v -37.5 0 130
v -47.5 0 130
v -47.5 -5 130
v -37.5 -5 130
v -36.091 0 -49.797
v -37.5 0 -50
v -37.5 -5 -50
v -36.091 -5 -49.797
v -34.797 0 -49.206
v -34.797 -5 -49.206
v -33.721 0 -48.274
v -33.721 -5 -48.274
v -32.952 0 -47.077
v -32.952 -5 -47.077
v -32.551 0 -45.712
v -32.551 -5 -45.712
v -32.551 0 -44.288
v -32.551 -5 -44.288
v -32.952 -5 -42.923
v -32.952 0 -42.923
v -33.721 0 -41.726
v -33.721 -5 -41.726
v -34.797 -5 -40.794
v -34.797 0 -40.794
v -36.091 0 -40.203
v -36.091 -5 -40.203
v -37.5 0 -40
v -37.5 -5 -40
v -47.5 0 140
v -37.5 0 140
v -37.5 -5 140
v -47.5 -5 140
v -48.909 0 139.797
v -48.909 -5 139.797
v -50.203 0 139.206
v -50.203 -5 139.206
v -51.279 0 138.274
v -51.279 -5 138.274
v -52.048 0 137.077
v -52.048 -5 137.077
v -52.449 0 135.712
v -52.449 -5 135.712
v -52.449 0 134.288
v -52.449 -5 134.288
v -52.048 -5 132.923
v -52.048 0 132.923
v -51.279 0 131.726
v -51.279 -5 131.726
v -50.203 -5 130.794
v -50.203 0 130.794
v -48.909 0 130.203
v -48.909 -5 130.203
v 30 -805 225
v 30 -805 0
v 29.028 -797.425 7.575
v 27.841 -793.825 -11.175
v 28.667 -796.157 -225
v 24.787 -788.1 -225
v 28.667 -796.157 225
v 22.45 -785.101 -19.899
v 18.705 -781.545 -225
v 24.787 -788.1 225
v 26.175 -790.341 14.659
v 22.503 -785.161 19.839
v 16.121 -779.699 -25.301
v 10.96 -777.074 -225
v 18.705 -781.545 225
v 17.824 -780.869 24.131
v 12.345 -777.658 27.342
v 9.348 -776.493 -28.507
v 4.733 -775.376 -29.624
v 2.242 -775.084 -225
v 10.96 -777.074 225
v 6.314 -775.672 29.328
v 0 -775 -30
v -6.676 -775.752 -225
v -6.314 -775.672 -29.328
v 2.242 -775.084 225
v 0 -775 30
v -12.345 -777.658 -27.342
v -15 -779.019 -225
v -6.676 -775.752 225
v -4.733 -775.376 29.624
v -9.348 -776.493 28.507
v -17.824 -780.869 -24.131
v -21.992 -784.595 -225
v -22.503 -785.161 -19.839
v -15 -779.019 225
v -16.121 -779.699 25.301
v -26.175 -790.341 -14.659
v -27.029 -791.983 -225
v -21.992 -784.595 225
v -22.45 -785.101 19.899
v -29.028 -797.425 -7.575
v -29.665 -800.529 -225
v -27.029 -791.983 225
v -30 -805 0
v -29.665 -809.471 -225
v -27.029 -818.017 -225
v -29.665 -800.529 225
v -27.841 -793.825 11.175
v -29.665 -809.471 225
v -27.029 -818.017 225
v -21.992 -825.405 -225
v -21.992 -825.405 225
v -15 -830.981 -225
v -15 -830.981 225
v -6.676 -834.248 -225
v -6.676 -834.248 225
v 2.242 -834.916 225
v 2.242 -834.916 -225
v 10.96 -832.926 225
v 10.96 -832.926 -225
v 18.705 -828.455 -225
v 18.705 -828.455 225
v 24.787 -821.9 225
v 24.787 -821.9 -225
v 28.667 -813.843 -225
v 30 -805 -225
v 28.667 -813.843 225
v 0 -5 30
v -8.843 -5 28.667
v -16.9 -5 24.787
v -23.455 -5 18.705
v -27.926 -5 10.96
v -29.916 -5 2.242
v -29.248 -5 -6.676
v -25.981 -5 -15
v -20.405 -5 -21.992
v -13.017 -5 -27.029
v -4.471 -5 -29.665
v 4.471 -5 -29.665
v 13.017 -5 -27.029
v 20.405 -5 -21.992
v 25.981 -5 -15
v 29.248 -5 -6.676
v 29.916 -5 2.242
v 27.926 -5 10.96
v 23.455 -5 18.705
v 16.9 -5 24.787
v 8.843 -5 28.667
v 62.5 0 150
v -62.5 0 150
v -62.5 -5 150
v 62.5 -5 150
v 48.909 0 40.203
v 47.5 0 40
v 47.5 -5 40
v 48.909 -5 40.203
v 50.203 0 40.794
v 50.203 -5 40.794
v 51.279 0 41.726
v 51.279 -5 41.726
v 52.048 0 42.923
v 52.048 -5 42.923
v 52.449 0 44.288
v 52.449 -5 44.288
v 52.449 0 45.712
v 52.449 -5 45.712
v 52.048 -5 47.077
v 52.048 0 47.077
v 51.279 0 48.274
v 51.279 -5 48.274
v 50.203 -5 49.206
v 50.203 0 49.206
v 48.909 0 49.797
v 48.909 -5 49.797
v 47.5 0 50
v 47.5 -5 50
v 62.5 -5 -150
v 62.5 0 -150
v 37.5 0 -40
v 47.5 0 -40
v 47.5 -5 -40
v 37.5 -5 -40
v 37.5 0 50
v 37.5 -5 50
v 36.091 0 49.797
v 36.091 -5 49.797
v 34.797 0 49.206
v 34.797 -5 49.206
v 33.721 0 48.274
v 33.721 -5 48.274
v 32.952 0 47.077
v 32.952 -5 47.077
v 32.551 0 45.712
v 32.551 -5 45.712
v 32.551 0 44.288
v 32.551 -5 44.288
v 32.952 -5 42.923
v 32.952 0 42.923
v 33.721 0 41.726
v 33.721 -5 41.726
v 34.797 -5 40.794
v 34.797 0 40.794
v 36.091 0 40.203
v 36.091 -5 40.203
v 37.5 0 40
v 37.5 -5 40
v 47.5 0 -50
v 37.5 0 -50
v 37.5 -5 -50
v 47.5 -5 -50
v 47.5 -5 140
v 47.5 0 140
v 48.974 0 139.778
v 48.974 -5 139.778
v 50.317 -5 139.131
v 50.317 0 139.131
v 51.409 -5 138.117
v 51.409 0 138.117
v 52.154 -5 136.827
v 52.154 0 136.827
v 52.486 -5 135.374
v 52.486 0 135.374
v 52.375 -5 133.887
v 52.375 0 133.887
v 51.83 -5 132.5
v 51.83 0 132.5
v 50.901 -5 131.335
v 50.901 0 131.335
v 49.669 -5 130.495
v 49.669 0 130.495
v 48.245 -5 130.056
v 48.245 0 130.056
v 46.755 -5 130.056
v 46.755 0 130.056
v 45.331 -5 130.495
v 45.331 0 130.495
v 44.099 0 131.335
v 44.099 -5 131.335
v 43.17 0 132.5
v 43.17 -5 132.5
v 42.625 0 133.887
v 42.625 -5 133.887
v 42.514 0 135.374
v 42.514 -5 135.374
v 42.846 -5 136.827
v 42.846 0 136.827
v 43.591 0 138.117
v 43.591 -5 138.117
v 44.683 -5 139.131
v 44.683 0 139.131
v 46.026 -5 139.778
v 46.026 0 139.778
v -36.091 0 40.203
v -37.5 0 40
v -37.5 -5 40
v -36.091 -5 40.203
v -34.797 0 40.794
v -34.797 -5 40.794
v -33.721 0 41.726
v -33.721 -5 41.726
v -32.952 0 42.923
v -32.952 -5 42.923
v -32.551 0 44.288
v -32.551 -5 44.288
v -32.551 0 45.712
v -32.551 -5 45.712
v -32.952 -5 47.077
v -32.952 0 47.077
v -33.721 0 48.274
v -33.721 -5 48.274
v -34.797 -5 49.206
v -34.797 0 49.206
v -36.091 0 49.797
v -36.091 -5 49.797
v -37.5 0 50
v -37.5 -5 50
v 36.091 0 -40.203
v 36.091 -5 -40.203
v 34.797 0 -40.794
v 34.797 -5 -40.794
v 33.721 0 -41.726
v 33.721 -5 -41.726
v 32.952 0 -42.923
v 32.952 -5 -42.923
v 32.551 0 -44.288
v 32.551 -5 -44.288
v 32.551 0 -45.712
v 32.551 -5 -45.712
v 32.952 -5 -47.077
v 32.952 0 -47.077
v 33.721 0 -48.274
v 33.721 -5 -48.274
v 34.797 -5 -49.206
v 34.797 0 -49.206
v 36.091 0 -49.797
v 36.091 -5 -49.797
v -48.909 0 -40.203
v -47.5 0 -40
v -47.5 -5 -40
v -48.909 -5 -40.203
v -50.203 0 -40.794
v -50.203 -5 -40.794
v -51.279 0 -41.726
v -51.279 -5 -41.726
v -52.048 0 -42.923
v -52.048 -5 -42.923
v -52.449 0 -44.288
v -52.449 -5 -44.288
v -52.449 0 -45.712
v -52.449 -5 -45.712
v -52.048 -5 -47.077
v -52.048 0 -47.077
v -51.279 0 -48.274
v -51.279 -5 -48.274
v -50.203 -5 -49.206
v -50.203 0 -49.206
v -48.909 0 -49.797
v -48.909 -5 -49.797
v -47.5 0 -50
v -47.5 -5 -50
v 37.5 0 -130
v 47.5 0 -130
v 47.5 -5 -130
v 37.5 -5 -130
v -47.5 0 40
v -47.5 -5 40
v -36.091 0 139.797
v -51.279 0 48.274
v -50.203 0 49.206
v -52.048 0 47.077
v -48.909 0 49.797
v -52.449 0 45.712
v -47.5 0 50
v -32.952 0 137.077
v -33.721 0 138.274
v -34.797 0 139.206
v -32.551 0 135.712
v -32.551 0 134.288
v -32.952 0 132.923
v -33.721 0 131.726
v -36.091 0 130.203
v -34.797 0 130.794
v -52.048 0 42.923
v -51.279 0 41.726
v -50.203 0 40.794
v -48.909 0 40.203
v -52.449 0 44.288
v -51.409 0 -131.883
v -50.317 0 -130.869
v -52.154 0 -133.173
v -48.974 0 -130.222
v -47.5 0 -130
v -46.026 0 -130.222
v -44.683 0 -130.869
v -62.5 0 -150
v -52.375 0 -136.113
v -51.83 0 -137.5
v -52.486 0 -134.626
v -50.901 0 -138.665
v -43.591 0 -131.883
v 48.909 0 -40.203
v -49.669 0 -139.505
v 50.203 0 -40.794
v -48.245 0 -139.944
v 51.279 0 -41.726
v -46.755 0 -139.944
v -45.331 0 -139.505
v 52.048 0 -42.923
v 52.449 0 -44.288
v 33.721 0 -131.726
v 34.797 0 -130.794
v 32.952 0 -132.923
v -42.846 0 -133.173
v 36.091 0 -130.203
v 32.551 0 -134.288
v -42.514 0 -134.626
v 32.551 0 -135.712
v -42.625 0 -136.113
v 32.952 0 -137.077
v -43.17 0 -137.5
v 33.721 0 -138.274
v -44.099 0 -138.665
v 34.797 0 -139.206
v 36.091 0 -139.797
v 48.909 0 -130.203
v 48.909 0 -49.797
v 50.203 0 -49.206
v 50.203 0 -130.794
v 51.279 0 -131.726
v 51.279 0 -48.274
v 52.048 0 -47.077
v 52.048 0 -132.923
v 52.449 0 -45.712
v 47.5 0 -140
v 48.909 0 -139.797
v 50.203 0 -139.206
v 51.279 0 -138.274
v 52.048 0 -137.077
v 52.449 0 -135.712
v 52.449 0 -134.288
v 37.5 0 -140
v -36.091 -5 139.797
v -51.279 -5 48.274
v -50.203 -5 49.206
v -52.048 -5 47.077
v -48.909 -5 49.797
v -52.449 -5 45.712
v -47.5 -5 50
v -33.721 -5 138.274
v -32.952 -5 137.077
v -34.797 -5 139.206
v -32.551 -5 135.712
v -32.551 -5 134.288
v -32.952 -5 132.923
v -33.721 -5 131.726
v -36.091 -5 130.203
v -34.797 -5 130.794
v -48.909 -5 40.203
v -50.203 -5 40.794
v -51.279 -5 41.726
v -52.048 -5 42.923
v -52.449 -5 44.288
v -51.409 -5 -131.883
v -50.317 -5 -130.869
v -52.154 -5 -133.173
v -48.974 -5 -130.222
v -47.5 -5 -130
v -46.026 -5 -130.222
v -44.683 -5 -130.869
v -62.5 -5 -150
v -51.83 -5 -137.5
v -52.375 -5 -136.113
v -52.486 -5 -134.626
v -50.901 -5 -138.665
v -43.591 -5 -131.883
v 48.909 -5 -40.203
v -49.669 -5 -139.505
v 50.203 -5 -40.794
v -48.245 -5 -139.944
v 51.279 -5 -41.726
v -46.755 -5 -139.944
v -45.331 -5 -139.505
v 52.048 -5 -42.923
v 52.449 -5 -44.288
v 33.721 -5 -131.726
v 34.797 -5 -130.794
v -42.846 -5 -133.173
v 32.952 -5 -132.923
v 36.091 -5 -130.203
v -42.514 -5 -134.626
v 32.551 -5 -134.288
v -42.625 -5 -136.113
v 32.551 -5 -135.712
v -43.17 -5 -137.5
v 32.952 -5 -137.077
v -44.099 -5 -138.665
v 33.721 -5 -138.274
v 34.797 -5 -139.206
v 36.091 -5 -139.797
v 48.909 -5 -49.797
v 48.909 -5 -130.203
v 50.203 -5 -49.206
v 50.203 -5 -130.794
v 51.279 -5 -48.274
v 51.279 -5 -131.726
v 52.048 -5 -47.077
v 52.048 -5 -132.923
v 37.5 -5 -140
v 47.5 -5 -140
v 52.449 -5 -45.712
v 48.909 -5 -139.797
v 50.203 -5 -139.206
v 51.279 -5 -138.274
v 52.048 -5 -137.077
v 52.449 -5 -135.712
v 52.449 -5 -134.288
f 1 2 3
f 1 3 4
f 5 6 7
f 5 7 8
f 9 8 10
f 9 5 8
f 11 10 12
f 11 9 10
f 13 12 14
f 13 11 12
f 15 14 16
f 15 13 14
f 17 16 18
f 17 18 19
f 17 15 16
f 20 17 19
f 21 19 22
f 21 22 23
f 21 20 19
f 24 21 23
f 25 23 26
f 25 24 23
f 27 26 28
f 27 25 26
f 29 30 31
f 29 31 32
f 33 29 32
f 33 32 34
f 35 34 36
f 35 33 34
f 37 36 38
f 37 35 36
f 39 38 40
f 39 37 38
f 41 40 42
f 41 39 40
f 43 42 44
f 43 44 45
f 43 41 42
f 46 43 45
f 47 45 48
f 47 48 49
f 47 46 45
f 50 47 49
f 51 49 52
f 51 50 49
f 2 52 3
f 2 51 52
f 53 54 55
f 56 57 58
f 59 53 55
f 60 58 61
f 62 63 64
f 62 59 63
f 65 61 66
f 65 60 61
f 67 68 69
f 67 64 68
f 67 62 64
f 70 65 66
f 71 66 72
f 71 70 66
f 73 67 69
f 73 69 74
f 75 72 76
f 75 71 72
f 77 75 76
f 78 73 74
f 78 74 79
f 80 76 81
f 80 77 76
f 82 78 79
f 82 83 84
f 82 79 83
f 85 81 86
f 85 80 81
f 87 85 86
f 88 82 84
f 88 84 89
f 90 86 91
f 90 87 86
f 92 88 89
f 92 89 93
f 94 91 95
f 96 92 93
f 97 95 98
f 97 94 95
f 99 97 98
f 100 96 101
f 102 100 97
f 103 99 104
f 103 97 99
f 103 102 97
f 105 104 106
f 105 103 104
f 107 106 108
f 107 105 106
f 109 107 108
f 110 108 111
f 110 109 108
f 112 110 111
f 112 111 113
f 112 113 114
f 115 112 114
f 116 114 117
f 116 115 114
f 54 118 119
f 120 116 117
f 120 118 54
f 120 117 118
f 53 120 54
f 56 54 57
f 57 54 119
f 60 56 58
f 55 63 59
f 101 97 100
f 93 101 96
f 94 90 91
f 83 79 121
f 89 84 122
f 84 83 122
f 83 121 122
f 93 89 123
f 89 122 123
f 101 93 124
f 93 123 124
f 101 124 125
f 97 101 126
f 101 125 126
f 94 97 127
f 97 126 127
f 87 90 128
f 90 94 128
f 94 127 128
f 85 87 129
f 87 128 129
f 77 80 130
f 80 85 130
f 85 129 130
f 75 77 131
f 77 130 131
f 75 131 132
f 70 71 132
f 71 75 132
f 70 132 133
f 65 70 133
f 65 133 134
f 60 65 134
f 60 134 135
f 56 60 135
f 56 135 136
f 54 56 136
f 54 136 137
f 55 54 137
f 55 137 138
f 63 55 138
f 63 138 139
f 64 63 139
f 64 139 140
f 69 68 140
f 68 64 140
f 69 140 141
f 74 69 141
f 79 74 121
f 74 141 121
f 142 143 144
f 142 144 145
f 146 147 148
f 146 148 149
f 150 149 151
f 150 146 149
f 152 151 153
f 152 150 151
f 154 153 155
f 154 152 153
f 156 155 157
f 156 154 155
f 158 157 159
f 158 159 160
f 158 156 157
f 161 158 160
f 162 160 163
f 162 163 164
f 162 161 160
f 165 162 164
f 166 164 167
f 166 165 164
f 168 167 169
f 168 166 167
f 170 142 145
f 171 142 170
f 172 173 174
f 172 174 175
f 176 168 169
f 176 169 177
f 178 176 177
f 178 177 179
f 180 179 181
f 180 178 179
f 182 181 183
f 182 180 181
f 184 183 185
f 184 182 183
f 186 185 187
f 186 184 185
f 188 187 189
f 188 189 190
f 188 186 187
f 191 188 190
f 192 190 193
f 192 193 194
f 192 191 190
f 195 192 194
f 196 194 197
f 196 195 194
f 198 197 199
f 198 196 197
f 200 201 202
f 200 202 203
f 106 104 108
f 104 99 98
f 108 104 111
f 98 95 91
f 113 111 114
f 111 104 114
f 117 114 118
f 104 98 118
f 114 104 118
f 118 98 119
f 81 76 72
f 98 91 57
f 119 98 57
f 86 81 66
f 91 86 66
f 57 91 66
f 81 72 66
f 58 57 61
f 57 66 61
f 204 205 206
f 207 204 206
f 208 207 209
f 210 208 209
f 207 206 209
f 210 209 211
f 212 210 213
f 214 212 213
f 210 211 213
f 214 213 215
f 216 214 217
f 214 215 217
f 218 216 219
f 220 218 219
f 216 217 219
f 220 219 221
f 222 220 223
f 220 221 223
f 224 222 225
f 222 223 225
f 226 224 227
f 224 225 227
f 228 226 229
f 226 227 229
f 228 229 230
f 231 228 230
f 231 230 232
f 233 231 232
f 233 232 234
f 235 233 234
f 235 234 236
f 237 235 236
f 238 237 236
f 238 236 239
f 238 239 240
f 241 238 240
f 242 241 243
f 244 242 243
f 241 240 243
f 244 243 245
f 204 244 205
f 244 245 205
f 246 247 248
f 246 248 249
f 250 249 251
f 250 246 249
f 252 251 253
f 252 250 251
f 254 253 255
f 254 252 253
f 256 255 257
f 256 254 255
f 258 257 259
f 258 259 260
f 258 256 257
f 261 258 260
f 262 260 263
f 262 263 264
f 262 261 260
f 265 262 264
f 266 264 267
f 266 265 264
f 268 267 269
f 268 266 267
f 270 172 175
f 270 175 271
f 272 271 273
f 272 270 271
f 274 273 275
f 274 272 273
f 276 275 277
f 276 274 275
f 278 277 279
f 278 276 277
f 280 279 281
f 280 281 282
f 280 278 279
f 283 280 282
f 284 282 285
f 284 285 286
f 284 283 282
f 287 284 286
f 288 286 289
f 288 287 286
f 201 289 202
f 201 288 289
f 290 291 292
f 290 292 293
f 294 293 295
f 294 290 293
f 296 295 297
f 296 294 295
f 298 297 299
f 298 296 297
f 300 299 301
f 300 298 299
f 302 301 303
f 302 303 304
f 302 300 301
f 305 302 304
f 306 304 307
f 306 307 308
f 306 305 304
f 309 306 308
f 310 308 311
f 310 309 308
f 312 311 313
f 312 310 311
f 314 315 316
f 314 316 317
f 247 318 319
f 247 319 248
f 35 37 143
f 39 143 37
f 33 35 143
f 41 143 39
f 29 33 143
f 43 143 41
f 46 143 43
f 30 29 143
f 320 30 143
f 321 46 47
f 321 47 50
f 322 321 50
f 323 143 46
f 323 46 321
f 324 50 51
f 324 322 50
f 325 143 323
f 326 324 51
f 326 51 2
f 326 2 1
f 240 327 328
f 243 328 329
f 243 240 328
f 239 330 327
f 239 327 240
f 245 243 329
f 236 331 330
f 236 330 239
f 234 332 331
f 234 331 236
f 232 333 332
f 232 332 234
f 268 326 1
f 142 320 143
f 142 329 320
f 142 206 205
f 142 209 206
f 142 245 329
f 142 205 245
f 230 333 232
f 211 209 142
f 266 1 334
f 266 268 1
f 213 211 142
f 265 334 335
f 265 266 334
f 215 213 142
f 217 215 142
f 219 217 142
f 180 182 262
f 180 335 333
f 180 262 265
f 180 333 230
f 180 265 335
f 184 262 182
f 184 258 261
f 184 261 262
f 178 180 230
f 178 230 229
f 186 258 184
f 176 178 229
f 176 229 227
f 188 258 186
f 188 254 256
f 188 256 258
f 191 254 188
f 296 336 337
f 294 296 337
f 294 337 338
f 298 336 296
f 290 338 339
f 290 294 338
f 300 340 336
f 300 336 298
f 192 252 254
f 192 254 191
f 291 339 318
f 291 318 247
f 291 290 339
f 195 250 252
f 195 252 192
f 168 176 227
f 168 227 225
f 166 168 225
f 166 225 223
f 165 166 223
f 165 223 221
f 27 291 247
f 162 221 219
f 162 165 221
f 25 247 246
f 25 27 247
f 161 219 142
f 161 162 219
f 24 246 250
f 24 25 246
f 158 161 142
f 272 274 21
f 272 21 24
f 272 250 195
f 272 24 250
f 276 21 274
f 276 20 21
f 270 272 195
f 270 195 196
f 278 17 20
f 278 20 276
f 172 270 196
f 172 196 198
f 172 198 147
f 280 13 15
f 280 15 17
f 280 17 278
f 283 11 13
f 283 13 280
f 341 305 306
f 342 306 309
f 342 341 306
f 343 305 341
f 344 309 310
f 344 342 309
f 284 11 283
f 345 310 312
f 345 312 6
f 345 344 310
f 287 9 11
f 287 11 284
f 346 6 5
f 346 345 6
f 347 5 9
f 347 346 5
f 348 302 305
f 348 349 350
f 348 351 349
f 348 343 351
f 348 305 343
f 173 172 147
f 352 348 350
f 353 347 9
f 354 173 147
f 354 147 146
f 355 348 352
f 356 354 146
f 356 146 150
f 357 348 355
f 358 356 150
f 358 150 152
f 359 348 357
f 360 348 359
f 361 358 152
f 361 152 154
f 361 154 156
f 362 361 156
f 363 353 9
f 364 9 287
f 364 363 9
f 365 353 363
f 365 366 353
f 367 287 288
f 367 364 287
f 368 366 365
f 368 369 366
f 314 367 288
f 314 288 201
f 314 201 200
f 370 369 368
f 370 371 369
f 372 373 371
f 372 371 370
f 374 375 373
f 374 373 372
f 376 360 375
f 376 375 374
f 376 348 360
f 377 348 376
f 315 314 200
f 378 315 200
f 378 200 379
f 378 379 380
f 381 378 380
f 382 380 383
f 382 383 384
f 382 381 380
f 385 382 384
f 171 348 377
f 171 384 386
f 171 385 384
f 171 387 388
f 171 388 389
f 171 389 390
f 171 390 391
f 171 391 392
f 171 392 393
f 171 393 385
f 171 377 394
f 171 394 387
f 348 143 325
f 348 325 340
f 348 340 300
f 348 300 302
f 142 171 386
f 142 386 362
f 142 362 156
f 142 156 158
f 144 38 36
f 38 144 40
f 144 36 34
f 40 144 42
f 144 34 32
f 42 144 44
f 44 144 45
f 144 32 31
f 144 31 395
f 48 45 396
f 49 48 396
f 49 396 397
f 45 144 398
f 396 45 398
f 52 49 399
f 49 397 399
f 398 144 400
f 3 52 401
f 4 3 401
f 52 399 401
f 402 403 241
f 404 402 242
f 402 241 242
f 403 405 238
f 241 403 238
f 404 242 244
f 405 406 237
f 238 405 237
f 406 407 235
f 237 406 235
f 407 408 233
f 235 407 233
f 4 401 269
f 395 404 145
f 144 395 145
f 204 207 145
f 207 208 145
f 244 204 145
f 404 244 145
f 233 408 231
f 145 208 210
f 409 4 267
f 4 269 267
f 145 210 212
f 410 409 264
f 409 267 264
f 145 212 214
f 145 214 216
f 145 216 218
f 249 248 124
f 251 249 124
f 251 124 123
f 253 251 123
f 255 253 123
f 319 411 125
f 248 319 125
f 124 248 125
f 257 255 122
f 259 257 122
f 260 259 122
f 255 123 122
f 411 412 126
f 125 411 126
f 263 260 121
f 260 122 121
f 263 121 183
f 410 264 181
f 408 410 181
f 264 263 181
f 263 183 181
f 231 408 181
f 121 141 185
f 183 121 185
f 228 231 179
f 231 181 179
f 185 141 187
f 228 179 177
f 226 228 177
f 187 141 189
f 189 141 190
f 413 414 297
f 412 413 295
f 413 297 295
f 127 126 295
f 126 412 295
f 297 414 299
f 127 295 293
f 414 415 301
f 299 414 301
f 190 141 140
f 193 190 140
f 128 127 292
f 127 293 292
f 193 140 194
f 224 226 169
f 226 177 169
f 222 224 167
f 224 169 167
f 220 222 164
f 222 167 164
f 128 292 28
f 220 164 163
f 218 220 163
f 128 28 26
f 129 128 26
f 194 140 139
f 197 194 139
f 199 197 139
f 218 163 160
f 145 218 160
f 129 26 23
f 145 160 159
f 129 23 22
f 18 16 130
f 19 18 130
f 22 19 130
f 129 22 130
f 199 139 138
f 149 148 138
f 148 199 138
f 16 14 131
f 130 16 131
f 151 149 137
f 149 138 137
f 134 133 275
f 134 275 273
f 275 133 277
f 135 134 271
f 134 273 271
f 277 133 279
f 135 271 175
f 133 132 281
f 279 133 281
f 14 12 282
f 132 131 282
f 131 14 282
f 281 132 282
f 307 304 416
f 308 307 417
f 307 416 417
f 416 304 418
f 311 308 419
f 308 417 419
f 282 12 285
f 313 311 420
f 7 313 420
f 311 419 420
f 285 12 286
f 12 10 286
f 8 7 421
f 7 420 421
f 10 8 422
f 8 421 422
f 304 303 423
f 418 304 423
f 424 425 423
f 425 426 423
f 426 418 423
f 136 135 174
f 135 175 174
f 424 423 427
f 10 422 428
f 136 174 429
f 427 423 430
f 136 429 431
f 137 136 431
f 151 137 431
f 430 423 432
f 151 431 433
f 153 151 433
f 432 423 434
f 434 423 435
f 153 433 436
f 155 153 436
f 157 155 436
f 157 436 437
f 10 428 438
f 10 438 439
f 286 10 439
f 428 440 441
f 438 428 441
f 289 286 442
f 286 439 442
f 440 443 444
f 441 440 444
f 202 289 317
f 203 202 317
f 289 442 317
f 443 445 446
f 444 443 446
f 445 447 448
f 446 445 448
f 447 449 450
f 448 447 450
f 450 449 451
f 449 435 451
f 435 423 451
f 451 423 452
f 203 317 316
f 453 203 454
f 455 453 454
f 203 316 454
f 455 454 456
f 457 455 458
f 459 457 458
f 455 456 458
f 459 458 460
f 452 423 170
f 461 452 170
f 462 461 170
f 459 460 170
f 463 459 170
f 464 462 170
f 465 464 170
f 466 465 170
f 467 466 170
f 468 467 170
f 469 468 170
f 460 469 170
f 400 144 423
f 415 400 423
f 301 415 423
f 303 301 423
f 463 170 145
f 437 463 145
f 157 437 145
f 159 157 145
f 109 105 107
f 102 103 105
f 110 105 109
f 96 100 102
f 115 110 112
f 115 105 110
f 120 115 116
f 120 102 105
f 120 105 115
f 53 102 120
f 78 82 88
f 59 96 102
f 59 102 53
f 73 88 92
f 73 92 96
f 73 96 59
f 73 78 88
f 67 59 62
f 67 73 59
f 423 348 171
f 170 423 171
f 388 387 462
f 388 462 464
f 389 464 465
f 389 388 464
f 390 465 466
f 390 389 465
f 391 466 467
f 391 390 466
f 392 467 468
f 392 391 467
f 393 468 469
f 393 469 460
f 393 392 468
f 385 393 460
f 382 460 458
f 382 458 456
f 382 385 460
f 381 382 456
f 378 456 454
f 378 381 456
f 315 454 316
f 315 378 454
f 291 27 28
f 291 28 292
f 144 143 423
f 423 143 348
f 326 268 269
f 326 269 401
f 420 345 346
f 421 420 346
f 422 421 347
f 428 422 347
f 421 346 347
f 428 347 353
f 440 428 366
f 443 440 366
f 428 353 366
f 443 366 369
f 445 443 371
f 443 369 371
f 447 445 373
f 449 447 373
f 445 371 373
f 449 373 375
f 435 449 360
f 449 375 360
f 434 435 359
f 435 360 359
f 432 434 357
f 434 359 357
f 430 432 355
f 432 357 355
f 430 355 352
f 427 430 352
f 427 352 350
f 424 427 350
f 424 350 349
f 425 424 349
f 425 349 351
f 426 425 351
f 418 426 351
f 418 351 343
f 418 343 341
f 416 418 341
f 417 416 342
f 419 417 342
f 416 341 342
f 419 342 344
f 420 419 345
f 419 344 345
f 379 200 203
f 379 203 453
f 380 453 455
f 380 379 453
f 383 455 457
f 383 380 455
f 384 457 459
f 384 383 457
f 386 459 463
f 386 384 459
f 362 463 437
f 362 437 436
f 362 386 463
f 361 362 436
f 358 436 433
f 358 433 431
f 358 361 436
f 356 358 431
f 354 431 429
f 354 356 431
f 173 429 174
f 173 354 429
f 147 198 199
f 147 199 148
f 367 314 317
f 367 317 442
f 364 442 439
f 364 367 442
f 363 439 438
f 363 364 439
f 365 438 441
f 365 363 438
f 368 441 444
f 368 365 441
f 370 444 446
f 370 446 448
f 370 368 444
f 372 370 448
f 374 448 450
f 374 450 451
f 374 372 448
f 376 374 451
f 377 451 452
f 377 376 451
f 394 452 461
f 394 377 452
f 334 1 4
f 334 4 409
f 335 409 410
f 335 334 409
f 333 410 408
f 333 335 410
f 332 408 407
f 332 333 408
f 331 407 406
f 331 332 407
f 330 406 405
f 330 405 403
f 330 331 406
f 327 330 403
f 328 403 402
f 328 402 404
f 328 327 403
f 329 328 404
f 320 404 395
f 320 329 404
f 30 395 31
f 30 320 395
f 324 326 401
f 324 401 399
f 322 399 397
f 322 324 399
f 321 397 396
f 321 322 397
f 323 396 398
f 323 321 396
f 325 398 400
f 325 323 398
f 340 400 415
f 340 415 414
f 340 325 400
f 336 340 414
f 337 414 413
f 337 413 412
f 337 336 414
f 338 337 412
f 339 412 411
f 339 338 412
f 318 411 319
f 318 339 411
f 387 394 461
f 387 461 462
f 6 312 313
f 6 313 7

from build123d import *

# Parameters (mm, degrees)
SKETCH1_W           = 125
SKETCH1_H           = 300
SKETCH1_R           = 5
BOSS_EXTRUDE1_DEPTH = 5
SKETCH2_R           = 30
BOSS_EXTRUDE2_DEPTH = 800
SKETCH3_R           = 30
BOSS_EXTRUDE3_DEPTH = 225


with BuildPart() as part:
    # Sketch1 → Boss-Extrude1 (new body)
    with BuildSketch(Plane(origin=(0, 0, 0), x_dir=(1, 0, 0), z_dir=(0, 1, 0))):
        Rectangle(SKETCH1_W, SKETCH1_H)
        with BuildLine():
            ThreePointArc((-47.5, -140), (-52.5, -135), (-47.5, -130))
            Line((-47.5, -130), (-37.5, -130))
            ThreePointArc((-37.5, -130), (-32.5, -135), (-37.5, -140))
            Line((-37.5, -140), (-47.5, -140))
        make_face(mode=Mode.SUBTRACT)
        with BuildLine():
            ThreePointArc((-47.5, -50), (-52.5, -45), (-47.5, -40))
            Line((-47.5, -40), (-37.5, -40))
            ThreePointArc((-37.5, -40), (-32.5, -45), (-37.5, -50))
            Line((-37.5, -50), (-47.5, -50))
        make_face(mode=Mode.SUBTRACT)
        with Locations((47.5, -135)):
            Circle(SKETCH1_R, mode=Mode.SUBTRACT)
        with BuildLine():
            ThreePointArc((47.5, -40), (52.5, -45), (47.5, -50))
            Line((47.5, -50), (37.5, -50))
            ThreePointArc((37.5, -50), (32.5, -45), (37.5, -40))
            Line((37.5, -40), (47.5, -40))
        make_face(mode=Mode.SUBTRACT)
        with BuildLine():
            ThreePointArc((-47.5, 40), (-52.5, 45), (-47.5, 50))
            Line((-47.5, 50), (-37.5, 50))
            ThreePointArc((-37.5, 50), (-32.5, 45), (-37.5, 40))
            Line((-37.5, 40), (-47.5, 40))
        make_face(mode=Mode.SUBTRACT)
        with Locations((-47.5, 135)):
            Circle(SKETCH1_R, mode=Mode.SUBTRACT)
        with BuildLine():
            ThreePointArc((47.5, 50), (52.5, 45), (47.5, 40))
            Line((47.5, 40), (37.5, 40))
            ThreePointArc((37.5, 40), (32.5, 45), (37.5, 50))
            Line((37.5, 50), (47.5, 50))
        make_face(mode=Mode.SUBTRACT)
        with BuildLine():
            ThreePointArc((47.5, 140), (52.5, 135), (47.5, 130))
            Line((47.5, 130), (37.5, 130))
            ThreePointArc((37.5, 130), (32.5, 135), (37.5, 140))
            Line((37.5, 140), (47.5, 140))
        make_face(mode=Mode.SUBTRACT)
    extrude(amount=-BOSS_EXTRUDE1_DEPTH)

    # Sketch2 → Boss-Extrude2 (add)
    with BuildSketch(Plane(origin=(0, -5, 0), x_dir=(-1, 0, 0), z_dir=(0, -1, 0))):
        Circle(SKETCH2_R)
    extrude(amount=BOSS_EXTRUDE2_DEPTH)

    # Sketch3 → Boss-Extrude3 (add, symmetric)
    with BuildSketch(Plane.XY):
        with Locations((0, -805)):
            Circle(SKETCH3_R)
    extrude(amount=BOSS_EXTRUDE3_DEPTH, both=True)


solid = part.part
